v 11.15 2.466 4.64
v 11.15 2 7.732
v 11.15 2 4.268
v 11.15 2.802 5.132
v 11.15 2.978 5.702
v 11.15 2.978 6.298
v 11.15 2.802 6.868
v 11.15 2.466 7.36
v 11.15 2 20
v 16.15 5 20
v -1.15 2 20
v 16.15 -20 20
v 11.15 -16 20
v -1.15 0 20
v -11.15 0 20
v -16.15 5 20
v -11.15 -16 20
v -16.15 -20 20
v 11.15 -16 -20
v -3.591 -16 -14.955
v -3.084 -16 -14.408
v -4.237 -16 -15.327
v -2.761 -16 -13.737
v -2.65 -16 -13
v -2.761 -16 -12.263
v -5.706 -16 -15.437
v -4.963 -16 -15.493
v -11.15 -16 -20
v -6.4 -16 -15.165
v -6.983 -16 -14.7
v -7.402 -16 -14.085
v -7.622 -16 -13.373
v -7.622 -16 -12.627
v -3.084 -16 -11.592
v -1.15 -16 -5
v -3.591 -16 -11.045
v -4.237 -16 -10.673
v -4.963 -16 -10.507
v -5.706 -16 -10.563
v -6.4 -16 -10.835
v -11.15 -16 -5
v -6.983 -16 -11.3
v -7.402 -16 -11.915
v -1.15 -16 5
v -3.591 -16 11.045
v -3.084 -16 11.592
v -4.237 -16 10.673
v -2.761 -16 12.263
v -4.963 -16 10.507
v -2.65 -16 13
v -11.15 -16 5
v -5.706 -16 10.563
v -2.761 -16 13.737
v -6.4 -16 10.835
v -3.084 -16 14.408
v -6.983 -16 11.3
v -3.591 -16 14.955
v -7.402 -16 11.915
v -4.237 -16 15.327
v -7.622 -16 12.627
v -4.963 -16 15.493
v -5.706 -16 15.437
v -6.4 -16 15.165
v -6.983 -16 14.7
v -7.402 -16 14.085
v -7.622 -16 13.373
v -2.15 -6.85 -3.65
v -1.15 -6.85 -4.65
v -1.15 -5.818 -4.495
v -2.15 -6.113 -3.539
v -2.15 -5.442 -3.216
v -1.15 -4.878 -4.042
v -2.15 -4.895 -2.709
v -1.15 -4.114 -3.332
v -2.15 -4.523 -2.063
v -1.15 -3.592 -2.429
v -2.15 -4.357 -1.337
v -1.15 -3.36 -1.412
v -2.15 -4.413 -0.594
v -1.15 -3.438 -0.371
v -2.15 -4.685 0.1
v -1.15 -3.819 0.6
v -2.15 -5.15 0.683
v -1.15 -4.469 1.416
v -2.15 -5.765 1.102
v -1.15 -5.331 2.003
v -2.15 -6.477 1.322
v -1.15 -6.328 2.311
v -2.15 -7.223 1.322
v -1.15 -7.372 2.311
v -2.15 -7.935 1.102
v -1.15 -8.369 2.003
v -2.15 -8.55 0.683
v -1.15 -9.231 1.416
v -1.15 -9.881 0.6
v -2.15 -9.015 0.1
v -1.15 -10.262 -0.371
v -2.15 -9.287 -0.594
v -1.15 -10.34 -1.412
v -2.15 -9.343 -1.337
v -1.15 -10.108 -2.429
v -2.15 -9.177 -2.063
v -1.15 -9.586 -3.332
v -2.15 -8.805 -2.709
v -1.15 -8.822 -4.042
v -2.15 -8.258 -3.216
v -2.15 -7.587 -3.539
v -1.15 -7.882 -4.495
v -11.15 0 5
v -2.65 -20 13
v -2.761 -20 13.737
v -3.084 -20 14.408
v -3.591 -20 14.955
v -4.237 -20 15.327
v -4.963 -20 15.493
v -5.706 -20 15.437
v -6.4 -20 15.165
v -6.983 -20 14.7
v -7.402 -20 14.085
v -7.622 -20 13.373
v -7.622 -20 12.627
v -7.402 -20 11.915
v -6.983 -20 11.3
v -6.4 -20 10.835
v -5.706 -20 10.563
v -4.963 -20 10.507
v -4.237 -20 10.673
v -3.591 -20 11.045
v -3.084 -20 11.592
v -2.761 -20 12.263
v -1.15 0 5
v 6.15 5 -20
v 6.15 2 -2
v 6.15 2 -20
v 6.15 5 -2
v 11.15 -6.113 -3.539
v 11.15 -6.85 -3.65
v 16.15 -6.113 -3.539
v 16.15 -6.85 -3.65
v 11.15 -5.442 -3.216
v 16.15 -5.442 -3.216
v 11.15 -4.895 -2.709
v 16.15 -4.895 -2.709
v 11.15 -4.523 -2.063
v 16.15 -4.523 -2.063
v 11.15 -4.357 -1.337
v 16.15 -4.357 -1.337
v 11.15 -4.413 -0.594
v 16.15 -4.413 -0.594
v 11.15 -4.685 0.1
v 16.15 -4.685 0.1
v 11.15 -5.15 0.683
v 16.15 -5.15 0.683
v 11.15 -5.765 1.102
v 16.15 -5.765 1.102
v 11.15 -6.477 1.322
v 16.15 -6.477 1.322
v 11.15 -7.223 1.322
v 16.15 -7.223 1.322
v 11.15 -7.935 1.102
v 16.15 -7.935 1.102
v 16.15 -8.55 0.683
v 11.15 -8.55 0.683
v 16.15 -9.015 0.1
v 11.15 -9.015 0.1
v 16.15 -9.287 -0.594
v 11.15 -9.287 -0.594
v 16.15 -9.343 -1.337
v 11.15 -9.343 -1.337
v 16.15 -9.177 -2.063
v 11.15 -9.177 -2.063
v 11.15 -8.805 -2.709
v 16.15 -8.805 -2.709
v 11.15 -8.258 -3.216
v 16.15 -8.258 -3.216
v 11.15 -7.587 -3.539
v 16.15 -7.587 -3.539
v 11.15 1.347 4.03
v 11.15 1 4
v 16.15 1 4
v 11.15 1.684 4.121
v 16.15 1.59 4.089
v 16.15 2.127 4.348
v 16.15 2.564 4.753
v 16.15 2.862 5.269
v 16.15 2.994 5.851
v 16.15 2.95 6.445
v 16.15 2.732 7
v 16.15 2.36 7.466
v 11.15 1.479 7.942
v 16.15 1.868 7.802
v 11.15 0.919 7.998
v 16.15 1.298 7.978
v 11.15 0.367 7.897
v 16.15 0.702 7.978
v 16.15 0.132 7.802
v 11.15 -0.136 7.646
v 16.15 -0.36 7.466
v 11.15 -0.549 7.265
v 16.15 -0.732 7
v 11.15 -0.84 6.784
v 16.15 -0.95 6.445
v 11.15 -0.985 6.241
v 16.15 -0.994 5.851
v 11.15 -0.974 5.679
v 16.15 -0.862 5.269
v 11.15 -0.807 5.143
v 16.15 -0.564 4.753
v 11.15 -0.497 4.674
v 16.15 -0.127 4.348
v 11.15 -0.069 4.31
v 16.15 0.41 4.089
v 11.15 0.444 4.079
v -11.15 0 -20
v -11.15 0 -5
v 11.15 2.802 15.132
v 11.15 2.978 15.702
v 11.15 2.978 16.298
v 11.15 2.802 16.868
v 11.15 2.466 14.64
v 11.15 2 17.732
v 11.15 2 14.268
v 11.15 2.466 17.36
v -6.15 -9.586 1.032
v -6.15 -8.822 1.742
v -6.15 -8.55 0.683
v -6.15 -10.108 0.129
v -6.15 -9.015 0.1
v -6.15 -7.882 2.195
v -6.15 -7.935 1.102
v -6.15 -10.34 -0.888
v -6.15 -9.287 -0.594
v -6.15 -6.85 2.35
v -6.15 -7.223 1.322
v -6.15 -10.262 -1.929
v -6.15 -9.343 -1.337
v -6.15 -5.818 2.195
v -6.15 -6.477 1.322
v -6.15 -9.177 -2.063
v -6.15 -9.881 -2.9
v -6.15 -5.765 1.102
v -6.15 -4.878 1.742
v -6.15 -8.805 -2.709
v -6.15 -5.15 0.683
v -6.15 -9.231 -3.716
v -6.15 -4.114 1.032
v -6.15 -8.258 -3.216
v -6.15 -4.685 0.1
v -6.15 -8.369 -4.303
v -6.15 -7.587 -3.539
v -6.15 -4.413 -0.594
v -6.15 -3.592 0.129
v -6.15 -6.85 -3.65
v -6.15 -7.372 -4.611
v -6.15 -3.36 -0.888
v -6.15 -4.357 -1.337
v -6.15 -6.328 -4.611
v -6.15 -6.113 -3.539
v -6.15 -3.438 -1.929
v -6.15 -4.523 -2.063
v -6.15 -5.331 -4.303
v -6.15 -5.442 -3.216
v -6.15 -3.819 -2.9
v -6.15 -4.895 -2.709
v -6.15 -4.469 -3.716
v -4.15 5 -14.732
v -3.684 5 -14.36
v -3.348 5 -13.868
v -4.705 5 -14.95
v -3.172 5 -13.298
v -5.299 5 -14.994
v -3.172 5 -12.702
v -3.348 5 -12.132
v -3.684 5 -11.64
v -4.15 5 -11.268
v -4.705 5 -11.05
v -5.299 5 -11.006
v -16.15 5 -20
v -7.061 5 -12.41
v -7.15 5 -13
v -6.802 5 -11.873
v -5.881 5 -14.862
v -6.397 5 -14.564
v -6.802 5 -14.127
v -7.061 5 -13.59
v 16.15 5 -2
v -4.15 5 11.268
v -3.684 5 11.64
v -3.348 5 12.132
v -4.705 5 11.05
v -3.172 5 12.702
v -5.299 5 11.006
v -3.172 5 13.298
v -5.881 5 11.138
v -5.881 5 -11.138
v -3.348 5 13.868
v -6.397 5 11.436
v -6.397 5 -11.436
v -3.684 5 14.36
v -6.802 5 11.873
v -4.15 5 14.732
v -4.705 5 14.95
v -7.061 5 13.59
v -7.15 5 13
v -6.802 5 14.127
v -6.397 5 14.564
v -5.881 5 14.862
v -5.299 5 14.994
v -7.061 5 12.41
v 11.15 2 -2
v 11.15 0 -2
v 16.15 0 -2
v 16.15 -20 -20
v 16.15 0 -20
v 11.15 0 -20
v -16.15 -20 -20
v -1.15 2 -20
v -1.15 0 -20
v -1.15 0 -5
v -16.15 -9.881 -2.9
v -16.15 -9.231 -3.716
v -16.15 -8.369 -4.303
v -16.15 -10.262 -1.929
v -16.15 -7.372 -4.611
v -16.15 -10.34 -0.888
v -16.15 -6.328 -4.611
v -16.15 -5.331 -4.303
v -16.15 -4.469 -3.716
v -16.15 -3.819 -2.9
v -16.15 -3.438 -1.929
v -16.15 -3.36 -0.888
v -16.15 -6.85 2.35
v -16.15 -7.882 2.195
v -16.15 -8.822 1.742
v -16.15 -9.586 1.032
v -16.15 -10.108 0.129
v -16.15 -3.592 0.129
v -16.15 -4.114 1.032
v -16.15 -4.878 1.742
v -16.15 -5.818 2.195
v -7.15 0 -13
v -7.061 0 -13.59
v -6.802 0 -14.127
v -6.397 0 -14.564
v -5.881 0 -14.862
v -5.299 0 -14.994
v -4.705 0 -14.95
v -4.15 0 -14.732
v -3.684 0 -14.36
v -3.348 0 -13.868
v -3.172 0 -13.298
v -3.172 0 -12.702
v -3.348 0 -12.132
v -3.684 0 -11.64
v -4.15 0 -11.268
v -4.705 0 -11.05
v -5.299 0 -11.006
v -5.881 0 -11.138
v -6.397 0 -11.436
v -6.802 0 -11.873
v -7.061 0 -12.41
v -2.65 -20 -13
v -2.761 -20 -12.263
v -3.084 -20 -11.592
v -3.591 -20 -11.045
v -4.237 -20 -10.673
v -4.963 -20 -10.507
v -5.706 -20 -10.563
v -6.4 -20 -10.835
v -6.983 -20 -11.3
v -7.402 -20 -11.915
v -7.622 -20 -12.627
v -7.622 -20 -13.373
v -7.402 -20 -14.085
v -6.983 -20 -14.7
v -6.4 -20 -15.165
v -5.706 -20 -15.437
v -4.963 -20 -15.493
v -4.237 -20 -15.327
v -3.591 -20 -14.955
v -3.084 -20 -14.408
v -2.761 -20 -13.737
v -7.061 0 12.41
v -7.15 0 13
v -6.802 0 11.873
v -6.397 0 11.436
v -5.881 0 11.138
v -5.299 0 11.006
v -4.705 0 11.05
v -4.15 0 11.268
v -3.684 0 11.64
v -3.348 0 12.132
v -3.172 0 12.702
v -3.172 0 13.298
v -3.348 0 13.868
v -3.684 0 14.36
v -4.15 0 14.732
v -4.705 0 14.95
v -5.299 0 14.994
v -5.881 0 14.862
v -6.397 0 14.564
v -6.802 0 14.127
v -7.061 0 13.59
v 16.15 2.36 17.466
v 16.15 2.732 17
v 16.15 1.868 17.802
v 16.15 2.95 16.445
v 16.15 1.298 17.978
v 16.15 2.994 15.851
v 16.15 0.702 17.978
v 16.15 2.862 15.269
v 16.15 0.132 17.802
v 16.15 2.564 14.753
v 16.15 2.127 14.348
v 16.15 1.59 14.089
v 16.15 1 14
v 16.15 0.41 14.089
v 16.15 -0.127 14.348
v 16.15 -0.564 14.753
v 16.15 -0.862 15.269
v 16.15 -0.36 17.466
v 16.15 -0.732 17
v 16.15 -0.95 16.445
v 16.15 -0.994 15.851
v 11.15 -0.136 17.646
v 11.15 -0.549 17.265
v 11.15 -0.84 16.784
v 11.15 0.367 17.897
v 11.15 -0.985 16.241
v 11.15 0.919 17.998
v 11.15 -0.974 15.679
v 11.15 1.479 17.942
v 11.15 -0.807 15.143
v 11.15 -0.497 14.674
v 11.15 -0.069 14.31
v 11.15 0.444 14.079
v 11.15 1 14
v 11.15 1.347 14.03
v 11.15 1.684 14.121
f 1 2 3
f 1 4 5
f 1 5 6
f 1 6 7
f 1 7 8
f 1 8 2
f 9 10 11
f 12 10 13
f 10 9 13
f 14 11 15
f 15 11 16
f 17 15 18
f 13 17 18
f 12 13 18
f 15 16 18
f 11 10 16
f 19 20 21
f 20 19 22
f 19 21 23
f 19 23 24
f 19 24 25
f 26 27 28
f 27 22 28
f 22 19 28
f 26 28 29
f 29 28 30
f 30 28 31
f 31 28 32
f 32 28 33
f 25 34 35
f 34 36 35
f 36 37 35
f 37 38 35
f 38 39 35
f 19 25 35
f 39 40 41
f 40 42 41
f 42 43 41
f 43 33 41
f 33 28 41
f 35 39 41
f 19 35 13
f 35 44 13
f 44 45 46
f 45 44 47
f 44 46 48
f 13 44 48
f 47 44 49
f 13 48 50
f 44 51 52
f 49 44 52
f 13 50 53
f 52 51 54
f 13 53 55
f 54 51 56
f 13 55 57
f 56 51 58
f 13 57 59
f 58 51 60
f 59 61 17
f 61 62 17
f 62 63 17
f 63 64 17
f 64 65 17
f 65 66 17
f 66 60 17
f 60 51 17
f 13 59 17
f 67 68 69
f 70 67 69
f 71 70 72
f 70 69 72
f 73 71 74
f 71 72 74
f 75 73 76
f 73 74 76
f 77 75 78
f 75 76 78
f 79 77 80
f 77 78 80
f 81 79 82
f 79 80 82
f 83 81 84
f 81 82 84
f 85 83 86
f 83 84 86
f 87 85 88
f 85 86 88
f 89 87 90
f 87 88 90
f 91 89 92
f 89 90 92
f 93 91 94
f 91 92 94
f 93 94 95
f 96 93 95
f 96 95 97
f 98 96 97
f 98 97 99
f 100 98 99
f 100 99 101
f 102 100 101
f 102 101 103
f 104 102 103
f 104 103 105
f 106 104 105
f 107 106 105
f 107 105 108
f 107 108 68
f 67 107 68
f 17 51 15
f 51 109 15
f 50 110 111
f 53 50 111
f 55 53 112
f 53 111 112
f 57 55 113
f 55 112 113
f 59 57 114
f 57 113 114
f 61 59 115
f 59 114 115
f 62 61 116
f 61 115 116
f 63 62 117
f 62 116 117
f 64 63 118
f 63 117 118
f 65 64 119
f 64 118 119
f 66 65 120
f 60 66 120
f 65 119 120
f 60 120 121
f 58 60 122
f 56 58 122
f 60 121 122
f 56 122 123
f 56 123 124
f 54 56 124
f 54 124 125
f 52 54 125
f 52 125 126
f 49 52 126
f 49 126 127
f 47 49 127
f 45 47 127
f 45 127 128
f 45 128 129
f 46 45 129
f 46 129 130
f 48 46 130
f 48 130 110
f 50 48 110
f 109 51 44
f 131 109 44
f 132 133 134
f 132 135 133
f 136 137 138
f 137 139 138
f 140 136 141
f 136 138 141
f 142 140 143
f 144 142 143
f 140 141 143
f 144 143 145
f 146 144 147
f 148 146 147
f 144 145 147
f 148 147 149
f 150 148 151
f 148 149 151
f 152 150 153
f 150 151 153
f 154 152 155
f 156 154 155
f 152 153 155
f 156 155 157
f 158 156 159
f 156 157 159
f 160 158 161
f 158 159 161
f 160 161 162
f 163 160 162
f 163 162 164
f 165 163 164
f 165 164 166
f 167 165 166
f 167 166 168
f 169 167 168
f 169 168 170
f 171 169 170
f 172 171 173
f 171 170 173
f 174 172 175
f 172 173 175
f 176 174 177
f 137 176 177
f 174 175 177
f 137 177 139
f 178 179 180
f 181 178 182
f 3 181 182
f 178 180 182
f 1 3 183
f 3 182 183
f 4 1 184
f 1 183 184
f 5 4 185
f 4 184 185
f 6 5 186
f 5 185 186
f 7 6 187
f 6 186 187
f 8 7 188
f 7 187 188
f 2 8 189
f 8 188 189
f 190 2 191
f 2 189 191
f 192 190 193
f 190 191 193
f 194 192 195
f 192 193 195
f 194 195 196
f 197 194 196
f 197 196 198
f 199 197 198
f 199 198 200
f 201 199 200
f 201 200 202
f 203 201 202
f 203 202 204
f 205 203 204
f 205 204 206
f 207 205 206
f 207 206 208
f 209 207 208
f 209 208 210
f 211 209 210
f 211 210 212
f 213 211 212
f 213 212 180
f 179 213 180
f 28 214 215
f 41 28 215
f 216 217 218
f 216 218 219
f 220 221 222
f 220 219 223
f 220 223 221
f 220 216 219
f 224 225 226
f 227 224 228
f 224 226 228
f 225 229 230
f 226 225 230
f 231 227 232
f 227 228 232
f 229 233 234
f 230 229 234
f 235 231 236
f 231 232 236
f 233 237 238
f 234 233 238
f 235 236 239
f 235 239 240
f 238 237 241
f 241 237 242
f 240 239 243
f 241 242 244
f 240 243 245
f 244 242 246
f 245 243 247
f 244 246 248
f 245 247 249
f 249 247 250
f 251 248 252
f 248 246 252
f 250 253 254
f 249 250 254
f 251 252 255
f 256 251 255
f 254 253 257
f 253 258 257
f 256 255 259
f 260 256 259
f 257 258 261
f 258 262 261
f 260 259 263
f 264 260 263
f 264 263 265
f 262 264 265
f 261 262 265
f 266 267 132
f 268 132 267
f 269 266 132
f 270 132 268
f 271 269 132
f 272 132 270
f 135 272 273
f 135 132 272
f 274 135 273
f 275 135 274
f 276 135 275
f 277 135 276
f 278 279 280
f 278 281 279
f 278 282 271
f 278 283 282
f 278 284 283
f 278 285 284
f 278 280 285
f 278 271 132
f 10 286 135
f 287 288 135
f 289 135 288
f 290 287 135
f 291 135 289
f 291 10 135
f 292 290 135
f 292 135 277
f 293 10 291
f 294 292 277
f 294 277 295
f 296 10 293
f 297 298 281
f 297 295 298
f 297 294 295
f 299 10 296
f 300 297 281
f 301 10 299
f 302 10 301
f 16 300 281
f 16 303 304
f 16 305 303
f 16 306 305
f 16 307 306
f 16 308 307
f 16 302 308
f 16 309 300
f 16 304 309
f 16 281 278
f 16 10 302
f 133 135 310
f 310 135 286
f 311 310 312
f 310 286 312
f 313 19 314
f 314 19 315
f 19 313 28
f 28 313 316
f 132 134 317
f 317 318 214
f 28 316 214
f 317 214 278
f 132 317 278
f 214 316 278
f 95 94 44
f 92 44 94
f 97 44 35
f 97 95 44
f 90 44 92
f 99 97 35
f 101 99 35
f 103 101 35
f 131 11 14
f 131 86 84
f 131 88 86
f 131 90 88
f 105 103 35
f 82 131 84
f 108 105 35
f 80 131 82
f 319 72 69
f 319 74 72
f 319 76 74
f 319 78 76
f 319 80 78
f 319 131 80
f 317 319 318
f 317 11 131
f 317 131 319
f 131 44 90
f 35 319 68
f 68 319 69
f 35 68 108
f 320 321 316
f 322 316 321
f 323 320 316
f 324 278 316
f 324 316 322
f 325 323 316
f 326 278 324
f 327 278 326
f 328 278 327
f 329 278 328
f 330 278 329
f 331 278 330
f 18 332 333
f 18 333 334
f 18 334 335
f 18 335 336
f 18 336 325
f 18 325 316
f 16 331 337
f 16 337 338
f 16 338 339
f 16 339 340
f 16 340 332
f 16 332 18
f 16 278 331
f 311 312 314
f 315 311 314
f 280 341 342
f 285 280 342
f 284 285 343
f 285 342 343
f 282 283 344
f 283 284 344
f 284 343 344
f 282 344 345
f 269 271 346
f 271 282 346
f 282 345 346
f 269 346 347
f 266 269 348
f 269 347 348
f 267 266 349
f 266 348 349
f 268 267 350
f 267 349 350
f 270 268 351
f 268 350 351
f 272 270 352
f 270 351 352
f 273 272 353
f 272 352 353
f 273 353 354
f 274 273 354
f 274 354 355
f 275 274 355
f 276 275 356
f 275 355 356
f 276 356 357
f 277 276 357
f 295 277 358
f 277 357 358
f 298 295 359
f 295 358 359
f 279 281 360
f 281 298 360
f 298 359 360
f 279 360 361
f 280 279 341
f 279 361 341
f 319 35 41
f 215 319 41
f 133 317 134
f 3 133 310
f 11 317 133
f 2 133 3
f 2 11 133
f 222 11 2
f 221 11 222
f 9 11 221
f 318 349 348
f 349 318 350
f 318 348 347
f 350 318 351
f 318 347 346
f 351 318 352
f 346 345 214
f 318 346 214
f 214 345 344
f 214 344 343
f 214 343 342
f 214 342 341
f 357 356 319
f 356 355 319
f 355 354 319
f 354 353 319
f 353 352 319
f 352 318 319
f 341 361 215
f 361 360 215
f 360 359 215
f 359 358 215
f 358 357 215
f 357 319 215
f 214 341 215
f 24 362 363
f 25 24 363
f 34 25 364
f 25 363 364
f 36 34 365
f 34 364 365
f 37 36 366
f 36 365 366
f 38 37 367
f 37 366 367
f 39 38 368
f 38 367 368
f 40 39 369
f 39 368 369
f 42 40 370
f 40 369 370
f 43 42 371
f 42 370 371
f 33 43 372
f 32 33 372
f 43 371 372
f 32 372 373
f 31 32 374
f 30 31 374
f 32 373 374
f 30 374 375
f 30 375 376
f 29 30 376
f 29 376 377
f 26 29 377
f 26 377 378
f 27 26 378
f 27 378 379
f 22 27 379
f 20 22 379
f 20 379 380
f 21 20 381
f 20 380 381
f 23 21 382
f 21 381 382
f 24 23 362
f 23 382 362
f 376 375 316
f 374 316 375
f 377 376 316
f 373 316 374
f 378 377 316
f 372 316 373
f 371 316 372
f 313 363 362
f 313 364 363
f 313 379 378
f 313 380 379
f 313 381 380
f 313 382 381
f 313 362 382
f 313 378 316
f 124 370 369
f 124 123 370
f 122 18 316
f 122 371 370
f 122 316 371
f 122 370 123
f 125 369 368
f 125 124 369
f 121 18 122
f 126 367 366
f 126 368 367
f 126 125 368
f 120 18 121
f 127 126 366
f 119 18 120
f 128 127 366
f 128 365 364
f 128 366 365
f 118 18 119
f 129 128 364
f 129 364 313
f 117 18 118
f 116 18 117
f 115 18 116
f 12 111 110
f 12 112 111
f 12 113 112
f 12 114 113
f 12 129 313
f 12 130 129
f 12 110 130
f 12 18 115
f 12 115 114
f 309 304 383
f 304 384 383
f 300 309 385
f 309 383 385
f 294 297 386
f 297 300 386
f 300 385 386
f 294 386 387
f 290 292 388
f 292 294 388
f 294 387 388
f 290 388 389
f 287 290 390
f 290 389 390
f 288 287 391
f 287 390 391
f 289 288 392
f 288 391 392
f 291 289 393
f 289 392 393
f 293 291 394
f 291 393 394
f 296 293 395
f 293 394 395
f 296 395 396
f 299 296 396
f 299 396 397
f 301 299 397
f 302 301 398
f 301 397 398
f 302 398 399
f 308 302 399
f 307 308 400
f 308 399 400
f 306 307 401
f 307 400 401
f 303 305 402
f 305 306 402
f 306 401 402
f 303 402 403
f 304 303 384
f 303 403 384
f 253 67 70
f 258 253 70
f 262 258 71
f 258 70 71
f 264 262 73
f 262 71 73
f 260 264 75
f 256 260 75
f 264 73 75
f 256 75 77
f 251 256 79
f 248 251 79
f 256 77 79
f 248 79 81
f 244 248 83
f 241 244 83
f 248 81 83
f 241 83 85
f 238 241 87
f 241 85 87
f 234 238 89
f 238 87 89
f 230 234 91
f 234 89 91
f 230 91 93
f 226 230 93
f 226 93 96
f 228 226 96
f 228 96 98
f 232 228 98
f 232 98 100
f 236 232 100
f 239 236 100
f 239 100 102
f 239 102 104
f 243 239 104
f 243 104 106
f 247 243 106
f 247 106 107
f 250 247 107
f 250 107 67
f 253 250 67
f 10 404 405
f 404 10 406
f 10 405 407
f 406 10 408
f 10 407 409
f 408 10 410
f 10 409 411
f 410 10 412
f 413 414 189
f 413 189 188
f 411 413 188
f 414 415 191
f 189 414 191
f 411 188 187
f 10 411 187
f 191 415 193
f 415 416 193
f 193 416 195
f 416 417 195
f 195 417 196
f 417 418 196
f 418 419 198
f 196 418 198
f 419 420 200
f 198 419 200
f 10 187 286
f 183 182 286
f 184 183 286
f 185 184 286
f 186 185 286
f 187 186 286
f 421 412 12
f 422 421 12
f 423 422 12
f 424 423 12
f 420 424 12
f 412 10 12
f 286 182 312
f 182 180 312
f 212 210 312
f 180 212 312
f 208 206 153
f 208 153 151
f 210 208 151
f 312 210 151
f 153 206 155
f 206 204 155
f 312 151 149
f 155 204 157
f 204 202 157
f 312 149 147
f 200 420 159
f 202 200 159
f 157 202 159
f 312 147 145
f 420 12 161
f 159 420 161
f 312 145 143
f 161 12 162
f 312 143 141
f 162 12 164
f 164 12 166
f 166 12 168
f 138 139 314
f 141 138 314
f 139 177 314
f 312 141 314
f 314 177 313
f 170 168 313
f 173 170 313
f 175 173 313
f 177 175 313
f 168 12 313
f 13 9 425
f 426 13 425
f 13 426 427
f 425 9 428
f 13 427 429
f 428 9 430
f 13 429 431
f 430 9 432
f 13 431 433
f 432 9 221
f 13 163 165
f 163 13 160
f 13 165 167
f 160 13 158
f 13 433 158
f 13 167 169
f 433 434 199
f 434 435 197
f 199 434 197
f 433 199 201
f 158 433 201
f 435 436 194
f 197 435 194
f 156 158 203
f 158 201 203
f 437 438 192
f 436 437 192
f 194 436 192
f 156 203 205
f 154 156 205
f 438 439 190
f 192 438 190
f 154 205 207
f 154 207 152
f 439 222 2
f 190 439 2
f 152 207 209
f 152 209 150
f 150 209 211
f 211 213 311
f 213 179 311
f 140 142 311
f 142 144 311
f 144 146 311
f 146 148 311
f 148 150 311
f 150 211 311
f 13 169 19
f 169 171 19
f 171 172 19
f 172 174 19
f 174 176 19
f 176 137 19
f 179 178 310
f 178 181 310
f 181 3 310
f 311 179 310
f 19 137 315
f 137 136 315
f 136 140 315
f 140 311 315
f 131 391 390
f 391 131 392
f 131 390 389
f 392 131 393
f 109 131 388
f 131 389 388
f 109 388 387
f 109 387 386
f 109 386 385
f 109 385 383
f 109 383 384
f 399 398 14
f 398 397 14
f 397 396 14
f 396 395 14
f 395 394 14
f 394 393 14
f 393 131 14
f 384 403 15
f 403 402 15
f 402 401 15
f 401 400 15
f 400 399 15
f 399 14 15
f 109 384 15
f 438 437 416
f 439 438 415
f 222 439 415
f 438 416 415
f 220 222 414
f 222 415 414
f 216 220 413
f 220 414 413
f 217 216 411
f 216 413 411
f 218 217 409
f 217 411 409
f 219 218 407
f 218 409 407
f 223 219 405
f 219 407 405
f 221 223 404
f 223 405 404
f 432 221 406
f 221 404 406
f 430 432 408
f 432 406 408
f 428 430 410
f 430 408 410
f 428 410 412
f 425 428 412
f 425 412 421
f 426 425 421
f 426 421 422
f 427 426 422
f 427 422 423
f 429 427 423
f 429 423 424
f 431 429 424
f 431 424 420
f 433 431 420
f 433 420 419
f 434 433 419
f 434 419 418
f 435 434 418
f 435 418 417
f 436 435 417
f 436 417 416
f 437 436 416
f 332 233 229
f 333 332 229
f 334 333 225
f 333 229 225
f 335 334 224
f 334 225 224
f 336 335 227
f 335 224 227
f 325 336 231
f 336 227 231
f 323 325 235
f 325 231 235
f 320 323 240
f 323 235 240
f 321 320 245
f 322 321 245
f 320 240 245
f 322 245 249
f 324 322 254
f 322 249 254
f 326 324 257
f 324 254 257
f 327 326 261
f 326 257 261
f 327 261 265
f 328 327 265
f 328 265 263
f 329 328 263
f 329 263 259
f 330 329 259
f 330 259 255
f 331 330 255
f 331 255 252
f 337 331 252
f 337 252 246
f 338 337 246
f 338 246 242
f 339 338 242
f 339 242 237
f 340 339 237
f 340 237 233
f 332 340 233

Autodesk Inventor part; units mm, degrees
ref_plane "YZ Plane" through (0, 0, 0) normal (1, 0, 0) x (0, 1, 0)
ref_plane "XZ Plane" through (0, 0, 0) normal (0, 1, 0) x (-1, 0, 0)
ref_plane "XY Plane" through (0, 0, 0) normal (0, 0, 1) x (1, 0, 0)
sketch "Boceto1" plane through (0, 0, 0) normal (0, 1, 0) x (-1, 0, 0)
  line L0 (16.15, 20) -> (-16.15, 20)
  line L1 (-16.15, 20) -> (-16.15, -20)
  line L2 (-16.15, -20) -> (16.15, -20)
  line L3 (16.15, -20) -> (16.15, 20)
  line L4 (0, -3.0912) -> (0, 0)
  line L5 (0, 0) -> (2.0406, 0)
  circle A0 centre (5.15, 13) radius 2
  circle A1 centre (5.15, -13) radius 2
  dimension "d0" = 32.3
  dimension "d1" = 40
  dimension "d4" = 4
  dimension "d5" = 4
  dimension "d6" = 7
  dimension "d7" = 7
  dimension "d35" = 11
  dimension "d36" = 11
extrude "Extrusión1" add sketch "Boceto1" along normal blind 5
sketch "Boceto2" plane through (0, 0, 0) normal (0, -1, 0) x (1, 0, 0)
  line L0 (16.15, 20) -> (16.15, -20) projected
  line L1 (16.15, 20) -> (11.15, 20)
  line L2 (11.15, 20) -> (11.15, -20)
  line L3 (11.15, -20) -> (16.15, -20)
  line L4 (16.15, -20) -> (16.15, 20)
  line L5 (-16.15, -20) -> (-16.15, 20) projected
  line L6 (-16.15, 20) -> (16.15, 20) projected
  line L7 (-16.15, -20) -> (-11.15, -20)
  line L8 (-11.15, -20) -> (-11.15, 20)
  line L9 (-11.15, 20) -> (-16.15, 20)
  line L10 (-16.15, 20) -> (-16.15, -20)
  point P0 (0, 0)
  dimension "d8" = 5
  dimension "d9" = 5
extrude "Extrusión2" add sketch "Boceto2" along normal blind 20
sketch "Boceto3" plane through (-11.15, 0, 20) normal (1, 0, 0) x (0, 0, -1)
  line L0 (0, 0) -> (0, -20) projected
  line L1 (40, -20) -> (40, 5) projected
  line L2 (0, -20) -> (40, -20)
  line L3 (40, -20) -> (40, -16)
  line L4 (40, -16) -> (0, -16)
  line L5 (0, -16) -> (0, -20)
  point P0 (20, 0)
  point P1 (0, -16)
  dimension "d12" = 4
extrude "Extrusión3" add sketch "Boceto3" along normal up to surface (22.3 mm away)
sketch "Boceto4" plane through (16.15, 5, 20) normal (1, 0, 0) x (0, 0, -1)
  circle A0 centre (21.15, -11.85) radius 2.5
  line L0 (0, 0) -> (0, -25) projected
  line L1 (0, 0) -> (40, 0) projected
  point P0 (20, -5)
  dimension "d15" = 21.15
  dimension "d16" = 11.85
  dimension "d19" = 5
extrude "Extrusión4" cut sketch "Boceto4" against normal up to surface (5 mm away)
sketch "Boceto8" plane through (0, -20, 0) normal (0, -1, 0) x (1, 0, 0)
  circle A0 centre (-5.15, 13) radius 2 projected
  circle A1 centre (-5.15, -13) radius 2 projected
  circle A2 centre (-5.15, 13) radius 2.5
  circle A3 centre (-5.15, -13) radius 2.5
  point P0 (0, 0)
  dimension "d31" = 5
  dimension "d32" = 5
extrude "Extrusión7" cut sketch "Boceto8" against normal up to surface (4 mm away) contours A0 | A1 | A2 | A3
sketch "Boceto9" plane through (0, 0, 0) normal (0, -1, 0) x (1, 0, 0)
  line L0 (-16.15, -20) -> (-16.15, 20) projected
  line L1 (-16.15, 5) -> (-1.15, 5)
  line L2 (-1.15, 5) -> (-1.15, -5)
  line L3 (-1.15, -5) -> (-16.15, -5)
  line L4 (-16.15, -5) -> (-16.15, 5)
  line L5 (-18.3593, 0) -> (-23.2163, 0)
  point P0 (0, 0)
  dimension "d37" = 15
  dimension "d38" = 10
extrude "Extrusión8" add sketch "Boceto9" along normal up to surface (20 mm away)
sketch "Boceto5" plane through (-16.15, 5, -20) normal (-1, 0, 0) x (0, 0, 1)
  circle A0 centre (18.85, -11.85) radius 2.5 projected
  point P0 (20, -5)
hole "Agujero1" at (-16.15, -6.85, -1.15) direction (1, 0, 0) diameter 7 depth 15
sketch "Boceto10" plane through (-1.15, 0, 5) normal (1, 0, 0) x (0, 0, -1)
  circle A0 centre (6.15, -6.85) radius 3.5 projected
  circle A1 centre (6.15, -6.85) radius 2.5
  point P0 (5, 0)
  dimension "d41" = 5
extrude "Extrusión9" add sketch "Boceto10" against normal blind 5
sketch "Boceto11" plane through (-16.15, 5, 20) normal (0, 0, 1) x (1, 0, 0)
  point P0 (16.15, -5)
sketch "Boceto12" plane through (-16.15, 5, 20) normal (0, 0, 1) x (1, 0, 0)
  line L0 (5, -5) -> (27.3, -5) projected
  line L1 (27.3, -5) -> (15, -5)
  line L2 (15, -5) -> (15, -3)
  line L3 (15, -3) -> (27.3, -3)
  line L4 (27.3, -3) -> (27.3, -5)
  point P0 (16.15, -5)
  dimension "d44" = 2
extrude "Extrusión10" cut sketch "Boceto12" against normal up to surface (40 mm away)
chamfer "Chaflán1" distance 1 angle 45 1 edges at (-1.15, -6.85, 1.35)
sketch "Boceto13" plane through (16.15, 5, 20) normal (1, 0, 0) x (0, 0, -1)
  line L0 (40, -25) -> (40, 0) projected
  line L1 (40, 0) -> (22, 0)
  line L2 (22, 0) -> (22, -5)
  line L3 (22, -5) -> (40, -5)
  line L4 (40, -5) -> (40, 0)
  point P0 (20, -5)
  dimension "d50" = 18
  dimension "d51" = 5
extrude "Extrusión11" cut sketch "Boceto13" against normal blind 10
sketch "Boceto16" plane through (16.15, -20, 20) normal (1, 0, 0) x (0, 0, -1)
  circle A0 centre (4, 21) radius 2
  circle A1 centre (14, 21) radius 2
  line L0 (0, 25) -> (0, 0) projected
  line L1 (0, 25) -> (22, 25) projected
  point P0 (20, 20)
  dimension "d66" = 4
  dimension "d67" = 4
  dimension "d68" = 10
  dimension "d69" = 4
  dimension "d70" = 4
  dimension "d71" = 4
extrude "Extrusión14" cut sketch "Boceto16" against normal blind 5
equation "\"d5\" = d4"
equation "\"d36\" = d35"
equation "\"d9\" = d8"
equation "\"d67\" = d66"
equation "\"d71\" = d70"
properties part number "Base Idler Izq" material "Plástico PAEK"
